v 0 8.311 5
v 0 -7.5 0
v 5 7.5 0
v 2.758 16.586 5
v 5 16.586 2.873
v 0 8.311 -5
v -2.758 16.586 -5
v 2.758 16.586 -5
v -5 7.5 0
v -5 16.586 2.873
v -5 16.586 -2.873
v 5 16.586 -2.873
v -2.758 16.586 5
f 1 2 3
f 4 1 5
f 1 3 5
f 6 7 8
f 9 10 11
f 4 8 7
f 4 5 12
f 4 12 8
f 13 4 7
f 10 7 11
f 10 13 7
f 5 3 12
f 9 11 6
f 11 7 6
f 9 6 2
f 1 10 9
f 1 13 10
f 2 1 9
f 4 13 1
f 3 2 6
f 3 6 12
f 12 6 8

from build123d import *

# Parameters (mm, degrees)
F1_DEPTH = 5
F2_SIZE  = 4.99999


# Not quite as in the source:
# - a fillet or chamfer is up to 0.001 mm smaller than in the source, because OpenCascade refuses the exact size


with BuildPart() as f1:
    # F0 (on Top) → F1 (new body, symmetric)
    with BuildSketch(Plane.XY):
        Polygon((-5, 7.5), (0, -7.5), (5, 7.5), (5, 16.5857542306), (-5, 16.5857542306), align=None)
    extrude(amount=F1_DEPTH, both=True)

    # F2 (size 5 in the source; OpenCascade refuses exactly that, so slightly less here)
    f2_edges = [f1.edges().sort_by_distance(p)[0] for p in [
        (2.5, 0, -5),
        (-2.5, 0, -5),
        (2.5, 0, 5),
        (-2.5, 0, 5),
    ]]
    chamfer(f2_edges, length=F2_SIZE)


solid = f1.part
